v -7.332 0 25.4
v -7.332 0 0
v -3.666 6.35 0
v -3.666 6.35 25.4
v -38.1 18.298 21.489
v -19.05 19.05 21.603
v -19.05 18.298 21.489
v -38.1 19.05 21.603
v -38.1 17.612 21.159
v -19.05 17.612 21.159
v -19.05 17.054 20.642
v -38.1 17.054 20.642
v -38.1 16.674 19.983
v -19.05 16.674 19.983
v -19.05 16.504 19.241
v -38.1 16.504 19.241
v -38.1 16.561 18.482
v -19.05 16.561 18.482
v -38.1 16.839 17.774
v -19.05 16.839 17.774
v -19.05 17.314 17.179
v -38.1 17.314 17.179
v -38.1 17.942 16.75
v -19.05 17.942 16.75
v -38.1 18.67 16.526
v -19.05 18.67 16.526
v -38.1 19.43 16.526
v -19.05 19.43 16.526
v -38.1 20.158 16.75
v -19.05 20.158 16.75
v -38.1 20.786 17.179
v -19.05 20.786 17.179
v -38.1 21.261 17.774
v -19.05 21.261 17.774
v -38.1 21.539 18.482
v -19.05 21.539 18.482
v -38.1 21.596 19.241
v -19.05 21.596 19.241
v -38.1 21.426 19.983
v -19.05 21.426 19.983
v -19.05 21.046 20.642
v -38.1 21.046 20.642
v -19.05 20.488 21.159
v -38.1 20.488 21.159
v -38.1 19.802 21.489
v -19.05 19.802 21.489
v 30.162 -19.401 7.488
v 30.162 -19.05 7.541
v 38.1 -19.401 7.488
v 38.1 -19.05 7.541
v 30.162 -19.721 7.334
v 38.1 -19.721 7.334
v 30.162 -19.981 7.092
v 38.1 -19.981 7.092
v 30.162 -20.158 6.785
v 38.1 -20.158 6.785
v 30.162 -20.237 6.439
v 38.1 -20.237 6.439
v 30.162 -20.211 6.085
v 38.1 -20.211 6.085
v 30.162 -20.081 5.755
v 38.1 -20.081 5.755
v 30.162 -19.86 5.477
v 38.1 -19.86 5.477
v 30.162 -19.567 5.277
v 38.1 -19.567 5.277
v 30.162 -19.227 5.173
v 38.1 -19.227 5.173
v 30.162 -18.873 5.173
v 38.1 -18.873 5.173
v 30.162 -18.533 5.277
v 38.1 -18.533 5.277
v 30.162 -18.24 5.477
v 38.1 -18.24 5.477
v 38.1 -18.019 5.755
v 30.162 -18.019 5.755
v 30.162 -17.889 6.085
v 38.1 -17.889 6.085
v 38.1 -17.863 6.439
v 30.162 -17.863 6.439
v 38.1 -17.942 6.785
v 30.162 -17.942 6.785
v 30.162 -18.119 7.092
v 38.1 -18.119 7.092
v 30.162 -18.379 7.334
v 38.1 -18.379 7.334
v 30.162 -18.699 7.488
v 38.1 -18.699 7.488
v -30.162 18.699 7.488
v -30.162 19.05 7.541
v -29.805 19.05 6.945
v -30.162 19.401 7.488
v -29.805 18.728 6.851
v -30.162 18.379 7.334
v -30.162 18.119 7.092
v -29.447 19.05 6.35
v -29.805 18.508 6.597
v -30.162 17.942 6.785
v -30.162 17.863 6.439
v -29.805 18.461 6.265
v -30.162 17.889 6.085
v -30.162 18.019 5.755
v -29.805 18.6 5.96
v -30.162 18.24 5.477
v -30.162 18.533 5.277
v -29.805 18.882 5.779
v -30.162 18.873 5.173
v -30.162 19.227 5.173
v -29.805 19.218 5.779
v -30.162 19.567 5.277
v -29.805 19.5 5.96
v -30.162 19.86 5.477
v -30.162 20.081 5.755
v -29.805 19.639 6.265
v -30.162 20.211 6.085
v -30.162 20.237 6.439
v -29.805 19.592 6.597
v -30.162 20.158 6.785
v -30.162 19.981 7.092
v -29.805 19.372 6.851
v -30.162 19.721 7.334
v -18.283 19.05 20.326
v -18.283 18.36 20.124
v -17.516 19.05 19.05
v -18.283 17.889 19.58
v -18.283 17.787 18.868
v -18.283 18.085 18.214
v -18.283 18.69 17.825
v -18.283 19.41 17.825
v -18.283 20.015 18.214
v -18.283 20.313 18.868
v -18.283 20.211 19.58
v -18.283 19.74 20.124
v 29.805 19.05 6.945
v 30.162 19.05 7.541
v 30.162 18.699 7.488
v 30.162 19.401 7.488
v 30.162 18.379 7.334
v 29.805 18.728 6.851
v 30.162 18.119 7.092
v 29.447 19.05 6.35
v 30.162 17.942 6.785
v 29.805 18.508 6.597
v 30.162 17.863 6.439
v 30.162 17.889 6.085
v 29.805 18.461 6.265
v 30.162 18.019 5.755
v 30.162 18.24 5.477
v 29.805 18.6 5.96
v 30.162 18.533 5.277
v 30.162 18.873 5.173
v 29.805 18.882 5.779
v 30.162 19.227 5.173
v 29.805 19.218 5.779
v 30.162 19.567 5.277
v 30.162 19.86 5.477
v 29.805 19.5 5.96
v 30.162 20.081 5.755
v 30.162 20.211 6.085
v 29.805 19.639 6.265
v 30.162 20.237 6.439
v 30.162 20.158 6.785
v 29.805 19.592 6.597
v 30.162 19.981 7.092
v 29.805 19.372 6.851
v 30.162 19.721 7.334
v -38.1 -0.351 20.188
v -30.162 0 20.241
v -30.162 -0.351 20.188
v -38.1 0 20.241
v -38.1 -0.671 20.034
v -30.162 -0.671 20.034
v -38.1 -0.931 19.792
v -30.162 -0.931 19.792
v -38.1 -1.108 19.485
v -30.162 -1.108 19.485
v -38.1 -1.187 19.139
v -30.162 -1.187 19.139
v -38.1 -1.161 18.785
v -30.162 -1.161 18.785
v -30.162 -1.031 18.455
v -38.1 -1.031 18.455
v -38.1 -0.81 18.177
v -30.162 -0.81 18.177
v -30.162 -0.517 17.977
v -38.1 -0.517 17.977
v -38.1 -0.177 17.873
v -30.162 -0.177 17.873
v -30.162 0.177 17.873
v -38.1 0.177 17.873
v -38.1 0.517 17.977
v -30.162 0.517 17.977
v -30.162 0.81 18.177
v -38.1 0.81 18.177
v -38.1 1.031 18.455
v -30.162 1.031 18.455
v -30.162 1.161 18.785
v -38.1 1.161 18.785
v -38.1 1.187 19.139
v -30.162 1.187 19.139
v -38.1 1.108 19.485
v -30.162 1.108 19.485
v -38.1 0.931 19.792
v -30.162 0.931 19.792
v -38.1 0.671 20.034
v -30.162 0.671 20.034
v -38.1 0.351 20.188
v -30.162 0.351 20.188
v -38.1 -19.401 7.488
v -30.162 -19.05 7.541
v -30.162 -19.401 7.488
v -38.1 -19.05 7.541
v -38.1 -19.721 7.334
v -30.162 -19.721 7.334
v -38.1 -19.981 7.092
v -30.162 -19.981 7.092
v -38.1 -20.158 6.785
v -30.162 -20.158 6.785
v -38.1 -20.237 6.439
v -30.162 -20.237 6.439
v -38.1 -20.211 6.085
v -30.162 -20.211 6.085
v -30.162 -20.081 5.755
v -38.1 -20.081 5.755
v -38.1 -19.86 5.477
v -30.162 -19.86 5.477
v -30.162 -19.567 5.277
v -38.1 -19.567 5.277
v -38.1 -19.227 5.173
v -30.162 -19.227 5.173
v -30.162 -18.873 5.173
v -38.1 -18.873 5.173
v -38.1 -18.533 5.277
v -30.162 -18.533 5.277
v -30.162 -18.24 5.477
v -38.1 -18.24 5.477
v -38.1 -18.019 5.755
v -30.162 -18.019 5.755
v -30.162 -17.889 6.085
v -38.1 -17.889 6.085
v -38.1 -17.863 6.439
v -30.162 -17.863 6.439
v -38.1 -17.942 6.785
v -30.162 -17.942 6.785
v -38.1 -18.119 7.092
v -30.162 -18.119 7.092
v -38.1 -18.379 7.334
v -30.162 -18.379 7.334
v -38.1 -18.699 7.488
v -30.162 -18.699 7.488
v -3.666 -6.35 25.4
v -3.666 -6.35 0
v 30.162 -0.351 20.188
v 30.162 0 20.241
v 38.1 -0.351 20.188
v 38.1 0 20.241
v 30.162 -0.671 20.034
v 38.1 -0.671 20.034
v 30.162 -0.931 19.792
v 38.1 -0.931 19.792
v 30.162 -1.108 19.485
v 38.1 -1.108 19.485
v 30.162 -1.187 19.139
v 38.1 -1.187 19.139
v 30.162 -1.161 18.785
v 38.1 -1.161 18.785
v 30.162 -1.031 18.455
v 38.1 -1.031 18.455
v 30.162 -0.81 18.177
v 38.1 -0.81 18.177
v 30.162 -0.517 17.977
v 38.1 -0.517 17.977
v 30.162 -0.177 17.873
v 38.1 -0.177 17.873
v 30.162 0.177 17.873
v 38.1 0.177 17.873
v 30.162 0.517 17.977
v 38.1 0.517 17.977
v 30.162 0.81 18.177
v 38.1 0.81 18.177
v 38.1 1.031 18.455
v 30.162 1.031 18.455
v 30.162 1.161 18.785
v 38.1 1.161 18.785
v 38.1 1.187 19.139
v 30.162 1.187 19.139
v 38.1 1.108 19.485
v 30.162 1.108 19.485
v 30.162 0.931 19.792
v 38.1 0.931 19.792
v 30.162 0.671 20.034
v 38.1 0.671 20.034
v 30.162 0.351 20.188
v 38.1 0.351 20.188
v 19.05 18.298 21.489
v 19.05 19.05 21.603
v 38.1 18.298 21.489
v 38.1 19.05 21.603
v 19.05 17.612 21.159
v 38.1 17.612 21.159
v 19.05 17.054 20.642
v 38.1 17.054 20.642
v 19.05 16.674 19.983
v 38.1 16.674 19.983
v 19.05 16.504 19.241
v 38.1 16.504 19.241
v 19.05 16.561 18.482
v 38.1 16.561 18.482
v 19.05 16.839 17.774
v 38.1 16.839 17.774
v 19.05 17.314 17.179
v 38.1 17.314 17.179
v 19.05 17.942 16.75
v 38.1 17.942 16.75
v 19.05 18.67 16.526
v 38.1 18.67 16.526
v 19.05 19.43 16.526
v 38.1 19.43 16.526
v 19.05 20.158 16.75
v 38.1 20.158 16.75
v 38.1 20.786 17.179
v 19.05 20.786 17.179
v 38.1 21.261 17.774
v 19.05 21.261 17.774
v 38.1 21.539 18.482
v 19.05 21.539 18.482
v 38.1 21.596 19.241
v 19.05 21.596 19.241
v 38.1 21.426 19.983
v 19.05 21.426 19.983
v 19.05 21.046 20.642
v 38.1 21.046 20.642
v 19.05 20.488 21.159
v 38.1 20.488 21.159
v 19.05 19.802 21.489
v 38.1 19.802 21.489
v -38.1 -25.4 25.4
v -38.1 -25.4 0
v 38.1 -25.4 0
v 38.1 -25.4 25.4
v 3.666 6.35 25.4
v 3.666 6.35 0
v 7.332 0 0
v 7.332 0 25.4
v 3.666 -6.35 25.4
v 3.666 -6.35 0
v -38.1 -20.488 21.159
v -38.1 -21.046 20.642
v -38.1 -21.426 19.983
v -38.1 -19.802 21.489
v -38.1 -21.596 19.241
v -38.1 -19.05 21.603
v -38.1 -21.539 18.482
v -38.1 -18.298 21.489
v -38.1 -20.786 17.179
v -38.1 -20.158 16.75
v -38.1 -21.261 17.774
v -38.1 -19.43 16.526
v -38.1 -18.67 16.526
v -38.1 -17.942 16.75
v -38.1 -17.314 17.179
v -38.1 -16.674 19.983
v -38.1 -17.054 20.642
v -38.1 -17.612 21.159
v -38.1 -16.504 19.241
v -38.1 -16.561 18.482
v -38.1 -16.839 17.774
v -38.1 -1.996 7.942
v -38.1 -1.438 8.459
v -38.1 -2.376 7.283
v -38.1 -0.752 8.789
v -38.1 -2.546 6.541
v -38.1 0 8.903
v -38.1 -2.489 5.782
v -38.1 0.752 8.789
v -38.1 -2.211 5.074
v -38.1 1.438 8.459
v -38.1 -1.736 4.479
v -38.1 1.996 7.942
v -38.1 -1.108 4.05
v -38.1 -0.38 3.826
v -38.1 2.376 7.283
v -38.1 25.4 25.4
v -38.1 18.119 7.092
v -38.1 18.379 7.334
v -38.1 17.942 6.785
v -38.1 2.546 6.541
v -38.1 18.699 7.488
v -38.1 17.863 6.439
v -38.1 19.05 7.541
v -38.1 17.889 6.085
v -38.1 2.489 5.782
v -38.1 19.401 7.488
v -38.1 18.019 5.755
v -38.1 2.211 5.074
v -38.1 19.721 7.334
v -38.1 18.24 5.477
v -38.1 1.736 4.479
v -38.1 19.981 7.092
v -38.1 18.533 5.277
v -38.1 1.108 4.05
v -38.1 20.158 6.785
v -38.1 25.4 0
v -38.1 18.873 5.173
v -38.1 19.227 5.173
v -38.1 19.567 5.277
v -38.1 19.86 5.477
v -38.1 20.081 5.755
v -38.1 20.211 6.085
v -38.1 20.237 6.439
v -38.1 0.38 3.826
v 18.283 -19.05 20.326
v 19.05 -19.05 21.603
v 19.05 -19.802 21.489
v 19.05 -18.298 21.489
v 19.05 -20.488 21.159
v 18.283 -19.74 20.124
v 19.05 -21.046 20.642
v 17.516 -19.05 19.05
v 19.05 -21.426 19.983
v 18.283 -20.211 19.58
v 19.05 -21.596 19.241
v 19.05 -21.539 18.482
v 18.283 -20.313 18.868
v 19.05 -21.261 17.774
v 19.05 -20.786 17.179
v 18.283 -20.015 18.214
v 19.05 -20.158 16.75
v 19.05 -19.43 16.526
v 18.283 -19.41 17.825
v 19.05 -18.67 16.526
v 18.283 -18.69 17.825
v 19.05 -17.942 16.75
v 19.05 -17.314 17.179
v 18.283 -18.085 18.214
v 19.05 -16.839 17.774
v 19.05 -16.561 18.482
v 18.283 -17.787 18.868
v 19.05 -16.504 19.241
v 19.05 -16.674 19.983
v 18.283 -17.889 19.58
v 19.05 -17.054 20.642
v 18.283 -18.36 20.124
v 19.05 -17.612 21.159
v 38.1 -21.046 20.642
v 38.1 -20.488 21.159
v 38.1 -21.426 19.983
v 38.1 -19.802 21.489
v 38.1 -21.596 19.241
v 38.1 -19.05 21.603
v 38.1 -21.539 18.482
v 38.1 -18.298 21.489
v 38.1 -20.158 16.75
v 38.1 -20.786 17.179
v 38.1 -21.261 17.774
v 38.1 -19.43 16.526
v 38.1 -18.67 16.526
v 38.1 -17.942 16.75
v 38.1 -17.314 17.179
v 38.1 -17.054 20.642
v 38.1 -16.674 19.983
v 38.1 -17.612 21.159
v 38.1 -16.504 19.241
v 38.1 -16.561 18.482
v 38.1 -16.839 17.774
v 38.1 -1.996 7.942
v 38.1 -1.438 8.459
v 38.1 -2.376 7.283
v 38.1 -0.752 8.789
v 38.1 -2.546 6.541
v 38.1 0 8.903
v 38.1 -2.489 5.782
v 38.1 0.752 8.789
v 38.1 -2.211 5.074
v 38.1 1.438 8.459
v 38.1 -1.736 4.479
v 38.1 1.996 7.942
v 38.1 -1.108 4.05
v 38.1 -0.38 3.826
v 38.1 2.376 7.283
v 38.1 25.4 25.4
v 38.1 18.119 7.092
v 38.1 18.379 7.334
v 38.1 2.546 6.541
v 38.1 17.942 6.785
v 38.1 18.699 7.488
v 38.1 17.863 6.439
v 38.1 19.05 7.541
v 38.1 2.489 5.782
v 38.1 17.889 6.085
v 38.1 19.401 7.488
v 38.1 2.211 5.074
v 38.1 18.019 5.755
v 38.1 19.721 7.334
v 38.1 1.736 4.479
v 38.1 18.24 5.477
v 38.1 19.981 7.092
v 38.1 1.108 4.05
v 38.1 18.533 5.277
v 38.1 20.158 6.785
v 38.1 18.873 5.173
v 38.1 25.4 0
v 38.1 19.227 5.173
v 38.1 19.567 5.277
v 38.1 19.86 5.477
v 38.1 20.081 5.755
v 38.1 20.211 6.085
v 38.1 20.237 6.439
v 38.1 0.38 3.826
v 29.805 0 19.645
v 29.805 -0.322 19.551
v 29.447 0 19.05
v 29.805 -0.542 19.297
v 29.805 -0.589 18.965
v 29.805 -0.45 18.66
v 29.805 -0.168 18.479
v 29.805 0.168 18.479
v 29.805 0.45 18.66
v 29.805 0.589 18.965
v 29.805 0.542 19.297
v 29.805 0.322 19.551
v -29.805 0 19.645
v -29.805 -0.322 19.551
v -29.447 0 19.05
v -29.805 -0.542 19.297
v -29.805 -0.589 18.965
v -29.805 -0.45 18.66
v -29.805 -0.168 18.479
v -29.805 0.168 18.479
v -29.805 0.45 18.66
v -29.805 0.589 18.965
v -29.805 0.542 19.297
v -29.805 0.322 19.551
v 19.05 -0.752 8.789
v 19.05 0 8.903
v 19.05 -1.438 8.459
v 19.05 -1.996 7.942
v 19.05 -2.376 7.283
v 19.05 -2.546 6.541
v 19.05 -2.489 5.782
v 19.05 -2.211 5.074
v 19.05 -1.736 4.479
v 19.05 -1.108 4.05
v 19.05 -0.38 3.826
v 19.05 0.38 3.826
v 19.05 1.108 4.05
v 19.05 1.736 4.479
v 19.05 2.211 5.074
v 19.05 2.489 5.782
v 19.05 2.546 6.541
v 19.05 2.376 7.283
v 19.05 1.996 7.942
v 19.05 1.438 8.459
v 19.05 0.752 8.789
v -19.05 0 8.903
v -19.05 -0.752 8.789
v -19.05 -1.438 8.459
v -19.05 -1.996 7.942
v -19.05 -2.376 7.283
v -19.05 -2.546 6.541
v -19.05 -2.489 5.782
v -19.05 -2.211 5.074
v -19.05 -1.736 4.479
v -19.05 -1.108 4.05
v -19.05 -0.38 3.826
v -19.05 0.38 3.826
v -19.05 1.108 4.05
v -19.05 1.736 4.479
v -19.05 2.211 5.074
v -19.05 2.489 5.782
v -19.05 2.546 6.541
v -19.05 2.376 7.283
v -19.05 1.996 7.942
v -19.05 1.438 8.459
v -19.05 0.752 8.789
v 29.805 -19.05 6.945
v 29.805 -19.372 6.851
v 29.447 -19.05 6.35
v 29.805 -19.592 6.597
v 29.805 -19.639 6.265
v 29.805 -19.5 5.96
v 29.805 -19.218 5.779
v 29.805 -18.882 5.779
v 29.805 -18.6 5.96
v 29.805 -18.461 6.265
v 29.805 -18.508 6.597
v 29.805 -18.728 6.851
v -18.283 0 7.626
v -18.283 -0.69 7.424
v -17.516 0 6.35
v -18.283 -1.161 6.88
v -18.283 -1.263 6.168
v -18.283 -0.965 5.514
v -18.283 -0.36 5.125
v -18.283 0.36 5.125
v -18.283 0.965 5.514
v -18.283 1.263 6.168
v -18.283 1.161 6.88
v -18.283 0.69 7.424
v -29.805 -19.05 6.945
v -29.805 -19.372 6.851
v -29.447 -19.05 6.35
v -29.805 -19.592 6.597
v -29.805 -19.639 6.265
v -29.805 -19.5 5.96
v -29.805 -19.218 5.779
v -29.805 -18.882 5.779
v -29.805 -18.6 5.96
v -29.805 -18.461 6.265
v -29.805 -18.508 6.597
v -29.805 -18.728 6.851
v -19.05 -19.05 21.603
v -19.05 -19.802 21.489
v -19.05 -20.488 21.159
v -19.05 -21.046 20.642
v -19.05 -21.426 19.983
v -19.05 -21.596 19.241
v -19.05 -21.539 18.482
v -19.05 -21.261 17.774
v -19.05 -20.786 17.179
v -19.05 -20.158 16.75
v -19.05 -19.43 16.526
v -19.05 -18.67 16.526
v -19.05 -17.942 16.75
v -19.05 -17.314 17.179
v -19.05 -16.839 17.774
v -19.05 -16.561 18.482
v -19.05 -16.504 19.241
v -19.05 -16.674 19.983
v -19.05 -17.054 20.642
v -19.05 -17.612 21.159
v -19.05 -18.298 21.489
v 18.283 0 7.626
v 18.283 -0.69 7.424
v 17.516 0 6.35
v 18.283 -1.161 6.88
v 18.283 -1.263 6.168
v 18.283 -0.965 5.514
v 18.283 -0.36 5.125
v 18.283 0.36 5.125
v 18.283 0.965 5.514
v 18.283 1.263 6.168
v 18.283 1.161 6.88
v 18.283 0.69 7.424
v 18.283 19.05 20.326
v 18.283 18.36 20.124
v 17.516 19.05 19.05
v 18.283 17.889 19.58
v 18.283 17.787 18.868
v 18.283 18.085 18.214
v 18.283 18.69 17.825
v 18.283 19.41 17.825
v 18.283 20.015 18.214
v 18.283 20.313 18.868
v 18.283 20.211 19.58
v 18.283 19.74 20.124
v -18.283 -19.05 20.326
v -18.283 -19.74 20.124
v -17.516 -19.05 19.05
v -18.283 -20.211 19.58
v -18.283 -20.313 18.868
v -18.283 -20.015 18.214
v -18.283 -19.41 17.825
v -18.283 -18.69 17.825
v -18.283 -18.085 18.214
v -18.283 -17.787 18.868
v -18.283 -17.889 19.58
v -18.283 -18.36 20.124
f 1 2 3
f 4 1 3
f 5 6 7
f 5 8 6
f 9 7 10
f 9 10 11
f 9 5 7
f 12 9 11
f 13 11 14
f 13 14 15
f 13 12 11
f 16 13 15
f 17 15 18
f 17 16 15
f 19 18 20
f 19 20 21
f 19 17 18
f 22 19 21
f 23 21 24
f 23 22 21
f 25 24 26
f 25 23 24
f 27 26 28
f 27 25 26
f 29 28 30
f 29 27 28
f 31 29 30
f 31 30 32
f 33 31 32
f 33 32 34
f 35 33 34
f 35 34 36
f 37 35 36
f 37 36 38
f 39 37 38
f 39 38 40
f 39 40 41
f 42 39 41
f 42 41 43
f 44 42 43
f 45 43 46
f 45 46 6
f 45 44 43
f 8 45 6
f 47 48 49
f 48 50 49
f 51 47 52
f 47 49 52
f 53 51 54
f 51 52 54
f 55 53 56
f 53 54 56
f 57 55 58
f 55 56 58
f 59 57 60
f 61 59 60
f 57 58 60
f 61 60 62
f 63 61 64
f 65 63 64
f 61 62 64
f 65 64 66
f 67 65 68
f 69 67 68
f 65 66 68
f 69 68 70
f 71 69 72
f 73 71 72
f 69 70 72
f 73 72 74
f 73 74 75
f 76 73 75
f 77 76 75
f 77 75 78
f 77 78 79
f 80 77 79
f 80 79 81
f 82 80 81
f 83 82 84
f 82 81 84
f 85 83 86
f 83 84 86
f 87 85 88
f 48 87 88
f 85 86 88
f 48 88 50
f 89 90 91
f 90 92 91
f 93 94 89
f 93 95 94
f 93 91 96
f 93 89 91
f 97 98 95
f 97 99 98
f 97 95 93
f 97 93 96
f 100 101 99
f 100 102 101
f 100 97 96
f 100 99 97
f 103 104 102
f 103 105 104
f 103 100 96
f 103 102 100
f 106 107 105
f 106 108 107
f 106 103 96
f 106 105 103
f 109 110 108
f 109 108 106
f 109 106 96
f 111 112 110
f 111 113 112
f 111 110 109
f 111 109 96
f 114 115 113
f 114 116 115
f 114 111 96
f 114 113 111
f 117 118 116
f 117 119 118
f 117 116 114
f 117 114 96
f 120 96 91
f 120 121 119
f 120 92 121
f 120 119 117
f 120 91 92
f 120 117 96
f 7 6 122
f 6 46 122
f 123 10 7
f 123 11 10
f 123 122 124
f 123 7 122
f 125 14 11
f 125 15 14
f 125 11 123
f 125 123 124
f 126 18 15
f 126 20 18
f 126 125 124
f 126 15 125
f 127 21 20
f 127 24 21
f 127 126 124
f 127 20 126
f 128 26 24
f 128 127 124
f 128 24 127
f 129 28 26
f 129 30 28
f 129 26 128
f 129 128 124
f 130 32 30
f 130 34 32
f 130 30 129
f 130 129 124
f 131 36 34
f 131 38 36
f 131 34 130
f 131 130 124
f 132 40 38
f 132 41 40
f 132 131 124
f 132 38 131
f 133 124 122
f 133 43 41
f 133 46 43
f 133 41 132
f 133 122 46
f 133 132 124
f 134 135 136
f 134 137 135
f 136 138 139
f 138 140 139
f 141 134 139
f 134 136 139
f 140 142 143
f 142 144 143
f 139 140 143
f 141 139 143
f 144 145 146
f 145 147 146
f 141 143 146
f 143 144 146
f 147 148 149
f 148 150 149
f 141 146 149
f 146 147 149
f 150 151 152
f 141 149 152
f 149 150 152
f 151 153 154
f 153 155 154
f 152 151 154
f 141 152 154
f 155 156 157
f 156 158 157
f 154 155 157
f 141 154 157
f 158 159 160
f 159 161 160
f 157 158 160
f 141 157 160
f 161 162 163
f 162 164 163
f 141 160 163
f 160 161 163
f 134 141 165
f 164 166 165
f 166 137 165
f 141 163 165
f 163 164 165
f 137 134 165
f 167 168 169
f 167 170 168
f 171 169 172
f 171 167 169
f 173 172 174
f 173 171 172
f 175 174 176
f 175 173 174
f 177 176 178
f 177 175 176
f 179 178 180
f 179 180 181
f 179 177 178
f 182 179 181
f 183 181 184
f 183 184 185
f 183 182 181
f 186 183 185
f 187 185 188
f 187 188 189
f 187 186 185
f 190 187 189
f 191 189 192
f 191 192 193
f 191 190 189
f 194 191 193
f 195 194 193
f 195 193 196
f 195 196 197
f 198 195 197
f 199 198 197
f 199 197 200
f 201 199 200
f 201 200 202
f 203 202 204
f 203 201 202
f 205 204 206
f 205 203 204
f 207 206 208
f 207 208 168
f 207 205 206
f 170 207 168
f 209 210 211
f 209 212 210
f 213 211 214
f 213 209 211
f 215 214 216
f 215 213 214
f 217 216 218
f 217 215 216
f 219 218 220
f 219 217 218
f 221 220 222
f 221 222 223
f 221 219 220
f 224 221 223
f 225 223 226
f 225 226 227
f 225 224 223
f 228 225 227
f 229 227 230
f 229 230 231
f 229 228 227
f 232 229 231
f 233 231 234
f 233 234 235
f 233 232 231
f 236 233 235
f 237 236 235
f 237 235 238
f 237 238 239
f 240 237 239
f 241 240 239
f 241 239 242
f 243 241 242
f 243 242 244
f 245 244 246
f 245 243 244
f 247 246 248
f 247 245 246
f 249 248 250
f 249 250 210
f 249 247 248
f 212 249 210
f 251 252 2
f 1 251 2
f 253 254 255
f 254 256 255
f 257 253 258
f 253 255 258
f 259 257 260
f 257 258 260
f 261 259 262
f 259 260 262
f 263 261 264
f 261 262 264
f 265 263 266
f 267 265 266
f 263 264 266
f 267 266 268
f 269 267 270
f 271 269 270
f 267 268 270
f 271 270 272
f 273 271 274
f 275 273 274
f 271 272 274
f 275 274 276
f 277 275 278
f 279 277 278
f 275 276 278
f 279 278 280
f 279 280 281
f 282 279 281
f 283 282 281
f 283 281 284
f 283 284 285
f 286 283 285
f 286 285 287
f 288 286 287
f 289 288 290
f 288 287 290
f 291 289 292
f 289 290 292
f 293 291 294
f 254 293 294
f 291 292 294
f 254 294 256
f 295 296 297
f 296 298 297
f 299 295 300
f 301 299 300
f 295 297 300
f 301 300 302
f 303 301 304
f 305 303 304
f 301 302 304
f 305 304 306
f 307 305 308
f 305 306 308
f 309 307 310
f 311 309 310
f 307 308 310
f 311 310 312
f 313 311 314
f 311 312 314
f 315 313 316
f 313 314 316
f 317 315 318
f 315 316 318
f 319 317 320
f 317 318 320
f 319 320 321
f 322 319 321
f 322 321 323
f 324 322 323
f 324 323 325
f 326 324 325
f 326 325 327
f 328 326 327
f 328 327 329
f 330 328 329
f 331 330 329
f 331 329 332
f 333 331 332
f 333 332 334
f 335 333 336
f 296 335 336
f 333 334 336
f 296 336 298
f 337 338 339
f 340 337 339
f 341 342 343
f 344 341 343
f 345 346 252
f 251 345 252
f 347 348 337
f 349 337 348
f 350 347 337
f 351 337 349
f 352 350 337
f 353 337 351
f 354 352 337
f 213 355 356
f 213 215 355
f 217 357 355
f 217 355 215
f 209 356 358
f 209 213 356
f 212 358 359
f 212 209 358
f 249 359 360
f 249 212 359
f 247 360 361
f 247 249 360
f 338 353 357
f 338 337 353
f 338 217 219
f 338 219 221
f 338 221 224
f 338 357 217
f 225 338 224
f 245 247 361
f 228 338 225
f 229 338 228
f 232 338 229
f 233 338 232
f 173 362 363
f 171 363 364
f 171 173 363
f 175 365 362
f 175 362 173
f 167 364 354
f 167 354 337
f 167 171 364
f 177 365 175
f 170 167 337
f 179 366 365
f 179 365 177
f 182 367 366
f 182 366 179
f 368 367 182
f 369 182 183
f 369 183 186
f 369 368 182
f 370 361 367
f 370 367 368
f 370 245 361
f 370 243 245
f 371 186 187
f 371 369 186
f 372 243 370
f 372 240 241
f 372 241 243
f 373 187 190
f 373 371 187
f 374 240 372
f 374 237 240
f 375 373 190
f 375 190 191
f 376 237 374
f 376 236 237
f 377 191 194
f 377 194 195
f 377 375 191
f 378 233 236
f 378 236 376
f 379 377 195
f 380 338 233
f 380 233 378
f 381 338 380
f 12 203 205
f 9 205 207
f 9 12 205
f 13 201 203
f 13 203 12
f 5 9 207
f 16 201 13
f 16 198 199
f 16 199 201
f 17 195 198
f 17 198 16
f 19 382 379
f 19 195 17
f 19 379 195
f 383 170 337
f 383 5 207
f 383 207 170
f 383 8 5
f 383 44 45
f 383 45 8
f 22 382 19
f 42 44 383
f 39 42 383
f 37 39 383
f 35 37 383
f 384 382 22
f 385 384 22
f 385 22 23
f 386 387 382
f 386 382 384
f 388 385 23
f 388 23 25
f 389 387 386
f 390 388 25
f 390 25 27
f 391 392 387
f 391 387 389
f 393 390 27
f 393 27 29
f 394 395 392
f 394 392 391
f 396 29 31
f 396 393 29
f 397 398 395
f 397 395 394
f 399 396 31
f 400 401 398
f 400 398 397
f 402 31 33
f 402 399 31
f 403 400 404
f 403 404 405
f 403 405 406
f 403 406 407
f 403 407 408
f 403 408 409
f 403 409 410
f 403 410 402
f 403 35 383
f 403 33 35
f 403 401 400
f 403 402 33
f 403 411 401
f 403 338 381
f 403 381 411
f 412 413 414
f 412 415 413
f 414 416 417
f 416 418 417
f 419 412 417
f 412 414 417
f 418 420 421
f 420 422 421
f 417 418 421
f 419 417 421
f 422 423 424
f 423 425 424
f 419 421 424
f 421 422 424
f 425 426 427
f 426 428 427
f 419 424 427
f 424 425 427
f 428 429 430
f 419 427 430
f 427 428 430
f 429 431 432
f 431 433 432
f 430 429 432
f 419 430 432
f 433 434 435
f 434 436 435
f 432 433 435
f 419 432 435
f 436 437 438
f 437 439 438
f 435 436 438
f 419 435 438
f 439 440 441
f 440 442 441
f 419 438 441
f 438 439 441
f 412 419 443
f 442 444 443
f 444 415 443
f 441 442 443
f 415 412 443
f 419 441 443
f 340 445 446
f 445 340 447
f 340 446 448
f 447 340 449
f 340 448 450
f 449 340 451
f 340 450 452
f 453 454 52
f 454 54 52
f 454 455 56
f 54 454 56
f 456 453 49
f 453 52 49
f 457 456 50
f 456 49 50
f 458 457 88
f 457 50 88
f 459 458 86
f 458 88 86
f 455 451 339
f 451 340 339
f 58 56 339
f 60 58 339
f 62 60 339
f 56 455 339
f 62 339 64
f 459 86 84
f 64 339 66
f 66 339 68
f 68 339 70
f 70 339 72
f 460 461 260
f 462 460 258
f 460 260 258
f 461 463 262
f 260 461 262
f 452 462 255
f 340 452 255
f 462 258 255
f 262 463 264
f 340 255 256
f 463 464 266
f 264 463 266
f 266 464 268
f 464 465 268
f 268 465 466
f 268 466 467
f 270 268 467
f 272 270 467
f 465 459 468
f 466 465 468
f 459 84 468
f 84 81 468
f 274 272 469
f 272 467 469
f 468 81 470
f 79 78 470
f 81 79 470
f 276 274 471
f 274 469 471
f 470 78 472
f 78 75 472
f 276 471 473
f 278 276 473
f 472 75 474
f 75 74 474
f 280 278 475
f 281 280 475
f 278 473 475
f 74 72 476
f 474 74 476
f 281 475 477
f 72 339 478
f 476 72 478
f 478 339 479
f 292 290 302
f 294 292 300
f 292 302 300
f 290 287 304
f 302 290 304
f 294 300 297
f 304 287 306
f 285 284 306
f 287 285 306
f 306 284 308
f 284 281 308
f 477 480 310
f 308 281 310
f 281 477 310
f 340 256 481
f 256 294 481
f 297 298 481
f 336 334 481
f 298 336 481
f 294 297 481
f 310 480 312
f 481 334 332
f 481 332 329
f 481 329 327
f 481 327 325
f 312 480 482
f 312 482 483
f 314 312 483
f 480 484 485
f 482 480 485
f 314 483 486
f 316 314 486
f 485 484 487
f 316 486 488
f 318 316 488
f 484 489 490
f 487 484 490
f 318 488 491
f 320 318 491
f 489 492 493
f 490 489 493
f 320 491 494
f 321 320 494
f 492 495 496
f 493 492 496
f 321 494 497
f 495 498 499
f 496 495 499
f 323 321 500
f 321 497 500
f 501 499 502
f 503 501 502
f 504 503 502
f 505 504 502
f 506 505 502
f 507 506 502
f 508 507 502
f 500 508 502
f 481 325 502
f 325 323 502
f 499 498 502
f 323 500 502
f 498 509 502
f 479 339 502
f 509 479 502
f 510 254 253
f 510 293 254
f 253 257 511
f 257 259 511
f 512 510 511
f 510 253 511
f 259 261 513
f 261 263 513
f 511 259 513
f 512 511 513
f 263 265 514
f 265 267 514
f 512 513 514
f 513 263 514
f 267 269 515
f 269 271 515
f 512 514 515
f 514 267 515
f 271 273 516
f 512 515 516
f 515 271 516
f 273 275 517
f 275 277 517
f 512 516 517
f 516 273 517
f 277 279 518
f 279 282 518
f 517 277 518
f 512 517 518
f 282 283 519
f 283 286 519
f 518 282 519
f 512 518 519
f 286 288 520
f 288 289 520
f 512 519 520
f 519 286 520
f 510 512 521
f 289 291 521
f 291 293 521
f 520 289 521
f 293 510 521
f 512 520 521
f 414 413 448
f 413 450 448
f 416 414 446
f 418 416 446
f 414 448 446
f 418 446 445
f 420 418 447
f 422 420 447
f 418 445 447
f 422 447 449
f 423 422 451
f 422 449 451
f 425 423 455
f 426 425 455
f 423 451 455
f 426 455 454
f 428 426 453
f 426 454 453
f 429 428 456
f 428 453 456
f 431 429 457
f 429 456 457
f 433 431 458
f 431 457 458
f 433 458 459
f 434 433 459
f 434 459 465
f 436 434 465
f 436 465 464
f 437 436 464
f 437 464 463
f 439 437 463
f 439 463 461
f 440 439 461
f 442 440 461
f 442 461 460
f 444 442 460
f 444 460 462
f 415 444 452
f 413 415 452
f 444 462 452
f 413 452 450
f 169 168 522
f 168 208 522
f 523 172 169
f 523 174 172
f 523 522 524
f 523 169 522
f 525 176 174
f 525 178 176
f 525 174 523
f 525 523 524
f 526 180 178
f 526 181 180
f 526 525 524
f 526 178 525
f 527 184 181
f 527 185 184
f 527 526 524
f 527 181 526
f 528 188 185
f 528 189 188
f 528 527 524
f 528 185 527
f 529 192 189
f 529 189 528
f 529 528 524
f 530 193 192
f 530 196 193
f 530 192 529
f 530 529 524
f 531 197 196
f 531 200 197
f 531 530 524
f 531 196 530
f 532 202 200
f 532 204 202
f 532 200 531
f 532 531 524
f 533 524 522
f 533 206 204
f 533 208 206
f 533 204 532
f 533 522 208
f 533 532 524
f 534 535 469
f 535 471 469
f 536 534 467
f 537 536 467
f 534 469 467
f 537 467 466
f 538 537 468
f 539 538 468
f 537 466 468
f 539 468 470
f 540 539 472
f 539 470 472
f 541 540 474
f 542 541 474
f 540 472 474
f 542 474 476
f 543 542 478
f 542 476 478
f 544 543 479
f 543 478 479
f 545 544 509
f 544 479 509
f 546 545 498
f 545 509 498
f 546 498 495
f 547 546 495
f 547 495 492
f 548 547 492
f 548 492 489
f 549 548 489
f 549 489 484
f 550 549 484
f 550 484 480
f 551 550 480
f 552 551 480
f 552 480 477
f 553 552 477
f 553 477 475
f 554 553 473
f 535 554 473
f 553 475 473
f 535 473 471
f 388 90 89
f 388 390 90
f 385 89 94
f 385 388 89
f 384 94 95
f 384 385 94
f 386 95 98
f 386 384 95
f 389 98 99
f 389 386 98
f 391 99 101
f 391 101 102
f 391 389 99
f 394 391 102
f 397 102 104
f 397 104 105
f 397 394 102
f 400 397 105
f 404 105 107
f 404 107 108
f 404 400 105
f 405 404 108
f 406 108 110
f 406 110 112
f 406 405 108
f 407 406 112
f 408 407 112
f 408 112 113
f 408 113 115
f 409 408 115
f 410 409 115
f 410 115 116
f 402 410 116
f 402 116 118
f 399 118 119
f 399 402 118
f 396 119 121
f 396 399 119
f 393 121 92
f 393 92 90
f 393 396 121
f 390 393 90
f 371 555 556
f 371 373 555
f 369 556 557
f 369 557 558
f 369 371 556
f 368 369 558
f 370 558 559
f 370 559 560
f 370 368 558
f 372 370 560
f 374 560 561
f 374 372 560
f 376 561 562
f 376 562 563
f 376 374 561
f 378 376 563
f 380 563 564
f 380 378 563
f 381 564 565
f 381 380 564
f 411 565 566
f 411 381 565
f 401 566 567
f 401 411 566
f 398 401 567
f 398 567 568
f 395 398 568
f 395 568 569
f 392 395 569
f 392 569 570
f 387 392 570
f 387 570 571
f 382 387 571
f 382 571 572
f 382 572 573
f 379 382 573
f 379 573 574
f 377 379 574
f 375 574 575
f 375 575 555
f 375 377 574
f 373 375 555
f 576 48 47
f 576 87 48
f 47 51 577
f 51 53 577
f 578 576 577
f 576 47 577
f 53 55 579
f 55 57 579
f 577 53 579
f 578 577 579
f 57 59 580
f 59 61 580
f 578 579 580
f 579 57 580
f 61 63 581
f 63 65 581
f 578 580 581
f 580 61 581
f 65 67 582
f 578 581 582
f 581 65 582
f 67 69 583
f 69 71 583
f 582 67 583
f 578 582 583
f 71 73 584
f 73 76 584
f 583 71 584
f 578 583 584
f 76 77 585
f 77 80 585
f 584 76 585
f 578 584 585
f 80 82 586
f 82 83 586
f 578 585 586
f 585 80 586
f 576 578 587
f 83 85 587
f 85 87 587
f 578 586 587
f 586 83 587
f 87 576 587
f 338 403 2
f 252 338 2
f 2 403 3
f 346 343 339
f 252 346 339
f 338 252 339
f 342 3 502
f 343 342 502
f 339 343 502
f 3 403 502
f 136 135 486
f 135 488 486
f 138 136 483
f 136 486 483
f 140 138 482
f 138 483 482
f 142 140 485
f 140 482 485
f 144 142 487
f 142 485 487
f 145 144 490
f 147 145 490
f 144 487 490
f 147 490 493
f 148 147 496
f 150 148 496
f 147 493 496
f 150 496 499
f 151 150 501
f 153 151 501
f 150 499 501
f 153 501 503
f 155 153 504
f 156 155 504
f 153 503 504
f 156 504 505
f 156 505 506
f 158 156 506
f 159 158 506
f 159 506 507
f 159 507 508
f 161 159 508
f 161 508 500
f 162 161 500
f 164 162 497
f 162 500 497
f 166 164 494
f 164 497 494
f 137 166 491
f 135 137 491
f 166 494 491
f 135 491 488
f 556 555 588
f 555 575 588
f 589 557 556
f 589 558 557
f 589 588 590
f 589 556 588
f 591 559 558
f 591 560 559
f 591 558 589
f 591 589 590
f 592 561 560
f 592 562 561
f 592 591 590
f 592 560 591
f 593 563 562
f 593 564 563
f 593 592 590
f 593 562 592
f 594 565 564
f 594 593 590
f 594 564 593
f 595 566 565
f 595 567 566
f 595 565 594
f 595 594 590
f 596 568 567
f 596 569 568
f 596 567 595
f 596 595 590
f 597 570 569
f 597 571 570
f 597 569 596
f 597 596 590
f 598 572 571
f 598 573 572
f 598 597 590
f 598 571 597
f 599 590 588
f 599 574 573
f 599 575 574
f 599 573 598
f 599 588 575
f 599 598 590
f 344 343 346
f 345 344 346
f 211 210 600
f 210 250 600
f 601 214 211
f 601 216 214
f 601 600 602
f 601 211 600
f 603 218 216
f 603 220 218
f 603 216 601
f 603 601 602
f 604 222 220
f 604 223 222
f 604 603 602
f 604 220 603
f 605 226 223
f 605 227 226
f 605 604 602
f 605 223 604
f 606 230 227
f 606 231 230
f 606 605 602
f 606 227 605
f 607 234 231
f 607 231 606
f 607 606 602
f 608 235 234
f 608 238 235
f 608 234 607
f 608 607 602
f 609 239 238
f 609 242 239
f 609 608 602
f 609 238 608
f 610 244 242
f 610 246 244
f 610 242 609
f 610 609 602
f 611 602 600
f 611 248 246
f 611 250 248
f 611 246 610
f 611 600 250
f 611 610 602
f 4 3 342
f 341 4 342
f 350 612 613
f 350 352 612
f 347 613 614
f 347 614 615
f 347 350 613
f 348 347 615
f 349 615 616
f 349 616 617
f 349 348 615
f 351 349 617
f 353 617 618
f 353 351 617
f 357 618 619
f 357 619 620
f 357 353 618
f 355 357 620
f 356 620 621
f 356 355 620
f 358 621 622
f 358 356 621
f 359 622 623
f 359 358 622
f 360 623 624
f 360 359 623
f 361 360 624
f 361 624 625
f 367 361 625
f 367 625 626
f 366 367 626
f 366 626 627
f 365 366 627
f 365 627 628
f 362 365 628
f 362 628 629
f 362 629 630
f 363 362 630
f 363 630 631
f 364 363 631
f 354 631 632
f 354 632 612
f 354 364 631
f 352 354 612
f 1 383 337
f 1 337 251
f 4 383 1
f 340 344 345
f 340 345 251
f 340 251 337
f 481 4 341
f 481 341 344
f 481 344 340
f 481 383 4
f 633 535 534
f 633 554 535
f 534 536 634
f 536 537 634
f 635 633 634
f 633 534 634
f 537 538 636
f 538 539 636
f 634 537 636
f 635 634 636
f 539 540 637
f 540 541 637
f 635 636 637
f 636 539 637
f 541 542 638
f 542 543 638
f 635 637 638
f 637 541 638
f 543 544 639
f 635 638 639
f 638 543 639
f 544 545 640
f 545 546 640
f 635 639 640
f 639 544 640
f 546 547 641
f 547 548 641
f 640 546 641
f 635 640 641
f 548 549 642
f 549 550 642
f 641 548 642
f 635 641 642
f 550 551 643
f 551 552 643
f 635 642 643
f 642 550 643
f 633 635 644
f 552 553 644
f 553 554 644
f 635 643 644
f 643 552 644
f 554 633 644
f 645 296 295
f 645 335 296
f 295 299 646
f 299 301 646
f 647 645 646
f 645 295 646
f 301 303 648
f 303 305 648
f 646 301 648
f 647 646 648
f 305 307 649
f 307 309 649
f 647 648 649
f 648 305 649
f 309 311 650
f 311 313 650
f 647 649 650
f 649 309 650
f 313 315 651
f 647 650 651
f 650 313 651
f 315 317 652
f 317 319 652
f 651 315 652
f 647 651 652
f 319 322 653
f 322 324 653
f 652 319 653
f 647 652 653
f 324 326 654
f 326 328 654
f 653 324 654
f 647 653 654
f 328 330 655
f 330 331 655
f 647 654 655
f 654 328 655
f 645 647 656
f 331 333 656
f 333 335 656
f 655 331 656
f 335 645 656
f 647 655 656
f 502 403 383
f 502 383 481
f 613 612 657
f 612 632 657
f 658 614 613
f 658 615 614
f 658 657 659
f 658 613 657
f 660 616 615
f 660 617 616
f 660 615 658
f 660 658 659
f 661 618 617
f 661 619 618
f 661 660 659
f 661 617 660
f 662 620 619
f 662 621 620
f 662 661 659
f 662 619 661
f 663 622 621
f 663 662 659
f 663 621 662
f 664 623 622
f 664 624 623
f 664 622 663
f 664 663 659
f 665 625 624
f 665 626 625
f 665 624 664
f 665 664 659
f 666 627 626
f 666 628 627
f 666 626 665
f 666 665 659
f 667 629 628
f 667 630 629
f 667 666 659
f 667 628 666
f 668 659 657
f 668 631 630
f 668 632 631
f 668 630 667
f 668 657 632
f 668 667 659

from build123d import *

# Parameters (mm, degrees)
SKETCH2_W                             = 76.2
SKETCH2_H                             = 50.8
BOSS_EXTRUDE1_DEPTH                   = 25.4
TAP_DRILL_FOR_1_4_20_TAP1_AT_2_COUNT  = 2
TAP_DRILL_FOR_1_4_20_TAP1_AT_2_PITCH  = 22.895250599
TAP_DRILL_FOR_1_4_20_TAP1_AT_3_COUNT  = 2
TAP_DRILL_FOR_1_4_20_TAP1_AT_3_PITCH  = 38.1
F_3_32_0_09375_DOWEL_HOLE1_AT_2_COUNT = 2
F_3_32_0_09375_DOWEL_HOLE1_AT_2_PITCH = 38.1
F_3_32_0_09375_DOWEL_HOLE1_AT_3_COUNT = 2
F_3_32_0_09375_DOWEL_HOLE1_AT_3_PITCH = 22.895250599
CUT_EXTRUDE1_DEPTH                    = 53.363441445


with BuildPart() as part:
    # Sketch2 → Boss-Extrude1 (new body)
    with BuildSketch(Plane.XY):
        Rectangle(SKETCH2_W, SKETCH2_H)
    extrude(amount=BOSS_EXTRUDE1_DEPTH)

    # Sketch6 → Tap Drill for 1/4-20 Tap1 (revolve, cut)
    with BuildSketch(Plane(origin=(-38.1, 19.05, 19.05), x_dir=(0, 0, 1), z_dir=(0, 1, 0))):
        Polygon((0, 0), (0, 20.583816902), (2.5527, 19.05), (2.5527, 0), align=None)
    tap_drill_for_1_4_20_tap1 = revolve(axis=Axis((-44.45, 19.05, 19.05), (1, 0, 0)), mode=Mode.SUBTRACT)

    # Tap Drill for 1/4-20 Tap1 at 2: Tap Drill for 1/4-20 Tap1 ×2
    with Locations(*[Vector(2.831898447985745e-15, -0.8320502943378457, -0.554700196225226) * (i * TAP_DRILL_FOR_1_4_20_TAP1_AT_2_PITCH) for i in range(1, TAP_DRILL_FOR_1_4_20_TAP1_AT_2_COUNT)]):
        add(tap_drill_for_1_4_20_tap1, mode=Mode.SUBTRACT)

    # Tap Drill for 1/4-20 Tap1 at 3: Tap Drill for 1/4-20 Tap1 ×2
    with Locations(*[(0, -i * TAP_DRILL_FOR_1_4_20_TAP1_AT_3_PITCH, 0) for i in range(1, TAP_DRILL_FOR_1_4_20_TAP1_AT_3_COUNT)]):
        add(tap_drill_for_1_4_20_tap1, mode=Mode.SUBTRACT)

    # Sketch8 → 3/32 (0.09375) Dowel Hole1 (revolve, cut)
    with BuildSketch(Plane(origin=(-38.1, 19.05, 6.35), x_dir=(0, 0, 1), z_dir=(0, 1, 0))):
        Polygon((0, 0), (0, 8.652899675), (1.190625, 7.9375), (1.190625, 0), align=None)
    f_3_32_0_09375_dowel_hole1 = revolve(axis=Axis((-44.45, 19.05, 6.35), (1, 0, 0)), mode=Mode.SUBTRACT)

    # 3/32 (0.09375) Dowel Hole1 at 2: 3/32 (0.09375) Dowel Hole1 ×2
    with Locations(*[(0, -i * F_3_32_0_09375_DOWEL_HOLE1_AT_2_PITCH, 0) for i in range(1, F_3_32_0_09375_DOWEL_HOLE1_AT_2_COUNT)]):
        add(f_3_32_0_09375_dowel_hole1, mode=Mode.SUBTRACT)

    # 3/32 (0.09375) Dowel Hole1 at 3: 3/32 (0.09375) Dowel Hole1 ×2
    with Locations(*[Vector(2.831898447985753e-15, -0.8320502943378447, 0.5547001962252276) * (i * F_3_32_0_09375_DOWEL_HOLE1_AT_3_PITCH) for i in range(1, F_3_32_0_09375_DOWEL_HOLE1_AT_3_COUNT)]):
        add(f_3_32_0_09375_dowel_hole1, mode=Mode.SUBTRACT)

    # Mirror1: Tap Drill for 1/4-20 Tap1, 3/32 (0.09375) Dowel Hole1 across plane
    add(tap_drill_for_1_4_20_tap1.mirror(Plane(origin=(0, 0, 0), x_dir=(0, 0, 1), z_dir=(1, 0, 0))), mode=Mode.SUBTRACT)
    add(f_3_32_0_09375_dowel_hole1.mirror(Plane(origin=(0, 0, 0), x_dir=(0, 0, 1), z_dir=(1, 0, 0))), mode=Mode.SUBTRACT)

    # Mirror1 copy 1 sketch → Mirror1 copy 1 (revolve, cut)
    with BuildSketch(Plane(origin=(38.1, 0, 6.35), x_dir=(0, 0, 1), z_dir=(0, 1, 0))):
        Polygon((0, 0), (0, -20.583816902), (2.5527, -19.05), (2.5527, 0), align=None)
    revolve(axis=Axis((44.45, 0, 6.35), (1, 0, 0)), mode=Mode.SUBTRACT)

    # Mirror1 copy 2 sketch → Mirror1 copy 2 (revolve, cut)
    with BuildSketch(Plane(origin=(38.1, -19.05, 19.05), x_dir=(0, 0, 1), z_dir=(0, 1, 0))):
        Polygon((0, 0), (0, -20.583816902), (2.5527, -19.05), (2.5527, 0), align=None)
    revolve(axis=Axis((44.45, -19.05, 19.05), (1, 0, 0)), mode=Mode.SUBTRACT)

    # Mirror1 copy 3 sketch → Mirror1 copy 3 (revolve, cut)
    with BuildSketch(Plane(origin=(38.1, -19.05, 6.35), x_dir=(0, 0, 1), z_dir=(0, 1, 0))):
        Polygon((0, 0), (0, -8.652899675), (1.190625, -7.9375), (1.190625, 0), align=None)
    revolve(axis=Axis((44.45, -19.05, 6.35), (1, 0, 0)), mode=Mode.SUBTRACT)

    # Mirror1 copy 4 sketch → Mirror1 copy 4 (revolve, cut)
    with BuildSketch(Plane(origin=(38.1, 0, 19.05), x_dir=(0, 0, 1), z_dir=(0, 1, 0))):
        Polygon((0, 0), (0, -8.652899675), (1.190625, -7.9375), (1.190625, 0), align=None)
    revolve(axis=Axis((44.45, 0, 19.05), (1, 0, 0)), mode=Mode.SUBTRACT)

    # Sketch4 → Cut-Extrude1 (cut, through all)
    with BuildSketch(Plane(origin=(0, 0, 0), x_dir=(-1, 0, 0), z_dir=(0, 0, -1))):
        Polygon((3.666174209, 6.35), (-3.666174209, 6.35), (-7.332348419, 0), (-3.666174209, -6.35), (3.666174209, -6.35), (7.332348419, 0), align=None)
    extrude(amount=-CUT_EXTRUDE1_DEPTH, mode=Mode.SUBTRACT)


solid = part.part
